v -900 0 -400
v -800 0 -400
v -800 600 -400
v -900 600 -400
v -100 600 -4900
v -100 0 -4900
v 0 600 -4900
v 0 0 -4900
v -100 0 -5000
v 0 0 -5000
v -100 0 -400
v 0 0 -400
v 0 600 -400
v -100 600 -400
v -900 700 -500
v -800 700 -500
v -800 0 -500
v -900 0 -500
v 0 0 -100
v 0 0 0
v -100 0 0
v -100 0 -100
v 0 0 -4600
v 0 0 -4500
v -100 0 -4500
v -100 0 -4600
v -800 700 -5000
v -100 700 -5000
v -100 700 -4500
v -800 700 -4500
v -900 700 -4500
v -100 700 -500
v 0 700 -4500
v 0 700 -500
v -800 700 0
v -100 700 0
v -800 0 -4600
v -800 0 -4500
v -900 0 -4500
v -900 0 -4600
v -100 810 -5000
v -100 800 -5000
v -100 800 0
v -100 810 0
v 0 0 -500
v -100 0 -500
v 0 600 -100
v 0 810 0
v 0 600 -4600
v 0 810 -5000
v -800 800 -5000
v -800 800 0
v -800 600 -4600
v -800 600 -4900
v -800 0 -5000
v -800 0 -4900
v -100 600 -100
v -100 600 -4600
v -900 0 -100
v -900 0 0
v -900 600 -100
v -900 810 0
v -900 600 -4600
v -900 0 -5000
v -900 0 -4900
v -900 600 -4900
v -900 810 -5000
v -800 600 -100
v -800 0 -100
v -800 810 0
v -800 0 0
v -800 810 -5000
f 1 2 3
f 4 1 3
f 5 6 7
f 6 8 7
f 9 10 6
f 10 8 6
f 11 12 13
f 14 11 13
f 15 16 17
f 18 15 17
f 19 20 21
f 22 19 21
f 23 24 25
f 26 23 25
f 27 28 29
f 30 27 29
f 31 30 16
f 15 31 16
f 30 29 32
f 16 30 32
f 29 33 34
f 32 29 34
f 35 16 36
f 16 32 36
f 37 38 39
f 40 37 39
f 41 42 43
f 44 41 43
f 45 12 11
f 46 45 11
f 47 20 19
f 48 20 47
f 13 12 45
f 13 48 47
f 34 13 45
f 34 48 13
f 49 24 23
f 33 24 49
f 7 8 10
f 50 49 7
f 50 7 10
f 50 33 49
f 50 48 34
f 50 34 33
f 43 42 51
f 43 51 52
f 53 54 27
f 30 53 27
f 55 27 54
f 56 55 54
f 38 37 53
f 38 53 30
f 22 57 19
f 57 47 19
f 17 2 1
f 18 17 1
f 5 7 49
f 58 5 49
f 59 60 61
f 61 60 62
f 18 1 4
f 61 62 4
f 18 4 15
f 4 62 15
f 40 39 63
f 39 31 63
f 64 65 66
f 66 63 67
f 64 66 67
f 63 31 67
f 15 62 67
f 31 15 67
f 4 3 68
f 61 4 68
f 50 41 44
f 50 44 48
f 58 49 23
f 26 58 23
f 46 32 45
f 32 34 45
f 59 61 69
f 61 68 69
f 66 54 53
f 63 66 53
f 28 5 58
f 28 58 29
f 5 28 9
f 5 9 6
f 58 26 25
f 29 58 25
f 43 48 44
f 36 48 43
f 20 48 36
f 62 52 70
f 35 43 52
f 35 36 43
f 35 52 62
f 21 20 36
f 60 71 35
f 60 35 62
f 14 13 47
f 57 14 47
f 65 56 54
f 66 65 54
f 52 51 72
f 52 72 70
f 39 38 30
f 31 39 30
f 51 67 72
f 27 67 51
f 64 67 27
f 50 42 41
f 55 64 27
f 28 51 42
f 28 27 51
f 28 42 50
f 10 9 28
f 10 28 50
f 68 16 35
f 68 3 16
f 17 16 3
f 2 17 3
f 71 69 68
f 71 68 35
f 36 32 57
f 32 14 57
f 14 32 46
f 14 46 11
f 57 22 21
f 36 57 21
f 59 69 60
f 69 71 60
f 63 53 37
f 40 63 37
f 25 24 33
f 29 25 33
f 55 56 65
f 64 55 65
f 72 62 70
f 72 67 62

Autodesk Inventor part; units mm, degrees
ref_plane "YZ Plane" through (0, 0, 0) normal (1, 0, 0) x (0, 1, 0)
ref_plane "XZ Plane" through (0, 0, 0) normal (0, 1, 0) x (-1, 0, 0)
ref_plane "XY Plane" through (0, 0, 0) normal (0, 0, 1) x (1, 0, 0)
sketch "Sketch9" plane through (0, 0, 0) normal (0, 1, 0) x (-1, 0, 0)
  line L0 (0, 0) -> (900, 0)
  line L1 (900, 0) -> (900, -5000)
  line L2 (900, -5000) -> (0, -5000)
  line L3 (0, -5000) -> (0, 0)
  line L4 (900, -5000) -> (800, -5000)
  line L5 (800, -5000) -> (800, 0)
  line L6 (800, 0) -> (900, 0)
  line L7 (900, 0) -> (900, -5000)
  line L8 (0, -5000) -> (100, -5000)
  line L9 (100, -5000) -> (100, 0)
  line L10 (100, 0) -> (0, 0)
  line L11 (0, 0) -> (0, -5000)
  dimension "d70" = 900
  dimension "d71" = 100
  dimension "d72" = 100
extrude "Extrusion6" add sketch "Sketch9" along normal blind 1100 contours L0 L9 L2 L3 | L0 L1 L2 L5
sketch "Sketch10" plane through (0, 0, 0) normal (1, 0, 0) x (0, 0, -1)
  line L0 (0, 0) -> (0, 1100) projected
  line L1 (0, 1100) -> (5000, 1100)
  line L2 (5000, 1100) -> (5000, 600)
  line L3 (5000, 600) -> (0, 600)
  line L4 (0, 600) -> (0, 1100)
  line L5 (0, 1100) -> (5000, 1100)
  line L6 (5000, 1100) -> (5000, 700)
  line L7 (5000, 700) -> (0, 700)
  line L8 (0, 700) -> (0, 1100)
  line L9 (0, 1100) -> (5000, 1100)
  line L10 (5000, 1100) -> (5000, 800)
  line L11 (5000, 800) -> (0, 800)
  line L12 (0, 800) -> (0, 1100)
  line L13 (5000, 0) -> (0, 0) projected
  line L14 (0, 0) -> (500, 0)
  line L15 (500, 0) -> (500, 600)
  line L16 (500, 600) -> (0, 600)
  line L17 (0, 600) -> (0, 0)
  line L18 (5000, 0) -> (4500, 0)
  line L19 (4500, 0) -> (4500, 600)
  line L20 (4500, 600) -> (5000, 600)
  line L21 (5000, 600) -> (5000, 0)
  point P0 (0, 800)
  dimension "d83" = 500
  dimension "d84" = 500
  dimension "d85" = 600
  dimension "d86" = 600
extrude "Extrusion7" add sketch "Sketch10" against normal blind 900 contours L0 L11 L2 L7
sketch "Sketch11" plane through (0, 0, 0) normal (1, 0, 0) x (0, 0, -1)
  point P0 (0, 0)
sketch "Sketch12" plane through (0, 0, 0) normal (1, 0, 0) x (0, 0, -1)
  line L0 (0, 0) -> (500, 0)
  line L1 (500, 0) -> (500, 600)
  line L2 (500, 600) -> (0, 600)
  line L3 (0, 600) -> (0, 0)
  line L4 (0, 0) -> (5000, 0) projected
  line L5 (5000, 0) -> (4500, 0)
  line L6 (4500, 0) -> (4500, 600)
  line L7 (4500, 600) -> (5000, 600)
  line L8 (5000, 600) -> (5000, 0)
  line L9 (500, 600) -> (4500, 600)
  dimension "d89" = 500
  dimension "d91" = 600
  dimension "d92" = 500
  dimension "d93" = 600
extrude "Extrusion8" cut sketch "Sketch12" against normal blind 900 contours L1 L9 L6 L4
sketch "Sketch13" plane through (0, 1100, 0) normal (0, 1, 0) x (1, 0, 0)
  line L0 (-900, 5000) -> (-900, 0) projected
  line L1 (0, 4500) -> (0, 5000) projected
  line L2 (-900, 0) -> (0, 0)
  line L3 (0, 0) -> (0, 5000)
  line L4 (0, 5000) -> (-900, 5000)
  line L5 (-900, 5000) -> (-900, 0)
extrude "Extrusion9" cut sketch "Sketch13" against normal blind 290
sketch "Sketch14" plane through (0, 0, 0) normal (1, 0, 0) x (0, 0, -1)
  line L0 (5000, 810) -> (0, 810) projected
  line L1 (0, 0) -> (0, 810) projected
  line L2 (0, 0) -> (500, 0) projected
  line L3 (500, 0) -> (500, 600) projected
  line L4 (500, 600) -> (4500, 600) projected
  line L5 (4500, 600) -> (4500, 0) projected
  line L6 (4500, 0) -> (5000, 0) projected
  line L7 (5000, 0) -> (5000, 810) projected
  line L8 (0, 0) -> (100, 0)
  line L9 (100, 0) -> (500, 0)
  line L10 (500, 0) -> (0, 0) projected
  line L11 (500, 0) -> (400, 0)
  line L12 (100, 0) -> (400, 0)
  line L13 (400, 0) -> (400, 600)
  line L14 (400, 600) -> (100, 600)
  line L15 (100, 600) -> (100, 0)
  line L16 (4500, 0) -> (4600, 0)
  line L17 (5000, 0) -> (4900, 0)
  line L18 (5000, 0) -> (4500, 0) projected
  line L19 (4600, 0) -> (4900, 0)
  line L20 (4900, 0) -> (4900, 600)
  line L21 (4900, 600) -> (4600, 600)
  line L22 (4600, 600) -> (4600, 0)
  line L23 (0, 700) -> (5000, 700) projected
  line L24 (500, 600) -> (4500, 600)
  line L25 (4500, 600) -> (4500, 700)
  line L26 (4500, 700) -> (500, 700)
  line L27 (500, 700) -> (500, 600)
  point P0 (500, 700)
  dimension "d98" = 100
  dimension "d99" = 100
  dimension "d100" = 100
  dimension "d101" = 100
extrude "Extrusion10" cut sketch "Sketch14" against normal through all contours L25 L4 L27 L23 | L6 L22 L21 L20 | L15 L14 L13 L2
properties part number "B_Transportadora_Recta_5m" material "Aluminum 6061"
